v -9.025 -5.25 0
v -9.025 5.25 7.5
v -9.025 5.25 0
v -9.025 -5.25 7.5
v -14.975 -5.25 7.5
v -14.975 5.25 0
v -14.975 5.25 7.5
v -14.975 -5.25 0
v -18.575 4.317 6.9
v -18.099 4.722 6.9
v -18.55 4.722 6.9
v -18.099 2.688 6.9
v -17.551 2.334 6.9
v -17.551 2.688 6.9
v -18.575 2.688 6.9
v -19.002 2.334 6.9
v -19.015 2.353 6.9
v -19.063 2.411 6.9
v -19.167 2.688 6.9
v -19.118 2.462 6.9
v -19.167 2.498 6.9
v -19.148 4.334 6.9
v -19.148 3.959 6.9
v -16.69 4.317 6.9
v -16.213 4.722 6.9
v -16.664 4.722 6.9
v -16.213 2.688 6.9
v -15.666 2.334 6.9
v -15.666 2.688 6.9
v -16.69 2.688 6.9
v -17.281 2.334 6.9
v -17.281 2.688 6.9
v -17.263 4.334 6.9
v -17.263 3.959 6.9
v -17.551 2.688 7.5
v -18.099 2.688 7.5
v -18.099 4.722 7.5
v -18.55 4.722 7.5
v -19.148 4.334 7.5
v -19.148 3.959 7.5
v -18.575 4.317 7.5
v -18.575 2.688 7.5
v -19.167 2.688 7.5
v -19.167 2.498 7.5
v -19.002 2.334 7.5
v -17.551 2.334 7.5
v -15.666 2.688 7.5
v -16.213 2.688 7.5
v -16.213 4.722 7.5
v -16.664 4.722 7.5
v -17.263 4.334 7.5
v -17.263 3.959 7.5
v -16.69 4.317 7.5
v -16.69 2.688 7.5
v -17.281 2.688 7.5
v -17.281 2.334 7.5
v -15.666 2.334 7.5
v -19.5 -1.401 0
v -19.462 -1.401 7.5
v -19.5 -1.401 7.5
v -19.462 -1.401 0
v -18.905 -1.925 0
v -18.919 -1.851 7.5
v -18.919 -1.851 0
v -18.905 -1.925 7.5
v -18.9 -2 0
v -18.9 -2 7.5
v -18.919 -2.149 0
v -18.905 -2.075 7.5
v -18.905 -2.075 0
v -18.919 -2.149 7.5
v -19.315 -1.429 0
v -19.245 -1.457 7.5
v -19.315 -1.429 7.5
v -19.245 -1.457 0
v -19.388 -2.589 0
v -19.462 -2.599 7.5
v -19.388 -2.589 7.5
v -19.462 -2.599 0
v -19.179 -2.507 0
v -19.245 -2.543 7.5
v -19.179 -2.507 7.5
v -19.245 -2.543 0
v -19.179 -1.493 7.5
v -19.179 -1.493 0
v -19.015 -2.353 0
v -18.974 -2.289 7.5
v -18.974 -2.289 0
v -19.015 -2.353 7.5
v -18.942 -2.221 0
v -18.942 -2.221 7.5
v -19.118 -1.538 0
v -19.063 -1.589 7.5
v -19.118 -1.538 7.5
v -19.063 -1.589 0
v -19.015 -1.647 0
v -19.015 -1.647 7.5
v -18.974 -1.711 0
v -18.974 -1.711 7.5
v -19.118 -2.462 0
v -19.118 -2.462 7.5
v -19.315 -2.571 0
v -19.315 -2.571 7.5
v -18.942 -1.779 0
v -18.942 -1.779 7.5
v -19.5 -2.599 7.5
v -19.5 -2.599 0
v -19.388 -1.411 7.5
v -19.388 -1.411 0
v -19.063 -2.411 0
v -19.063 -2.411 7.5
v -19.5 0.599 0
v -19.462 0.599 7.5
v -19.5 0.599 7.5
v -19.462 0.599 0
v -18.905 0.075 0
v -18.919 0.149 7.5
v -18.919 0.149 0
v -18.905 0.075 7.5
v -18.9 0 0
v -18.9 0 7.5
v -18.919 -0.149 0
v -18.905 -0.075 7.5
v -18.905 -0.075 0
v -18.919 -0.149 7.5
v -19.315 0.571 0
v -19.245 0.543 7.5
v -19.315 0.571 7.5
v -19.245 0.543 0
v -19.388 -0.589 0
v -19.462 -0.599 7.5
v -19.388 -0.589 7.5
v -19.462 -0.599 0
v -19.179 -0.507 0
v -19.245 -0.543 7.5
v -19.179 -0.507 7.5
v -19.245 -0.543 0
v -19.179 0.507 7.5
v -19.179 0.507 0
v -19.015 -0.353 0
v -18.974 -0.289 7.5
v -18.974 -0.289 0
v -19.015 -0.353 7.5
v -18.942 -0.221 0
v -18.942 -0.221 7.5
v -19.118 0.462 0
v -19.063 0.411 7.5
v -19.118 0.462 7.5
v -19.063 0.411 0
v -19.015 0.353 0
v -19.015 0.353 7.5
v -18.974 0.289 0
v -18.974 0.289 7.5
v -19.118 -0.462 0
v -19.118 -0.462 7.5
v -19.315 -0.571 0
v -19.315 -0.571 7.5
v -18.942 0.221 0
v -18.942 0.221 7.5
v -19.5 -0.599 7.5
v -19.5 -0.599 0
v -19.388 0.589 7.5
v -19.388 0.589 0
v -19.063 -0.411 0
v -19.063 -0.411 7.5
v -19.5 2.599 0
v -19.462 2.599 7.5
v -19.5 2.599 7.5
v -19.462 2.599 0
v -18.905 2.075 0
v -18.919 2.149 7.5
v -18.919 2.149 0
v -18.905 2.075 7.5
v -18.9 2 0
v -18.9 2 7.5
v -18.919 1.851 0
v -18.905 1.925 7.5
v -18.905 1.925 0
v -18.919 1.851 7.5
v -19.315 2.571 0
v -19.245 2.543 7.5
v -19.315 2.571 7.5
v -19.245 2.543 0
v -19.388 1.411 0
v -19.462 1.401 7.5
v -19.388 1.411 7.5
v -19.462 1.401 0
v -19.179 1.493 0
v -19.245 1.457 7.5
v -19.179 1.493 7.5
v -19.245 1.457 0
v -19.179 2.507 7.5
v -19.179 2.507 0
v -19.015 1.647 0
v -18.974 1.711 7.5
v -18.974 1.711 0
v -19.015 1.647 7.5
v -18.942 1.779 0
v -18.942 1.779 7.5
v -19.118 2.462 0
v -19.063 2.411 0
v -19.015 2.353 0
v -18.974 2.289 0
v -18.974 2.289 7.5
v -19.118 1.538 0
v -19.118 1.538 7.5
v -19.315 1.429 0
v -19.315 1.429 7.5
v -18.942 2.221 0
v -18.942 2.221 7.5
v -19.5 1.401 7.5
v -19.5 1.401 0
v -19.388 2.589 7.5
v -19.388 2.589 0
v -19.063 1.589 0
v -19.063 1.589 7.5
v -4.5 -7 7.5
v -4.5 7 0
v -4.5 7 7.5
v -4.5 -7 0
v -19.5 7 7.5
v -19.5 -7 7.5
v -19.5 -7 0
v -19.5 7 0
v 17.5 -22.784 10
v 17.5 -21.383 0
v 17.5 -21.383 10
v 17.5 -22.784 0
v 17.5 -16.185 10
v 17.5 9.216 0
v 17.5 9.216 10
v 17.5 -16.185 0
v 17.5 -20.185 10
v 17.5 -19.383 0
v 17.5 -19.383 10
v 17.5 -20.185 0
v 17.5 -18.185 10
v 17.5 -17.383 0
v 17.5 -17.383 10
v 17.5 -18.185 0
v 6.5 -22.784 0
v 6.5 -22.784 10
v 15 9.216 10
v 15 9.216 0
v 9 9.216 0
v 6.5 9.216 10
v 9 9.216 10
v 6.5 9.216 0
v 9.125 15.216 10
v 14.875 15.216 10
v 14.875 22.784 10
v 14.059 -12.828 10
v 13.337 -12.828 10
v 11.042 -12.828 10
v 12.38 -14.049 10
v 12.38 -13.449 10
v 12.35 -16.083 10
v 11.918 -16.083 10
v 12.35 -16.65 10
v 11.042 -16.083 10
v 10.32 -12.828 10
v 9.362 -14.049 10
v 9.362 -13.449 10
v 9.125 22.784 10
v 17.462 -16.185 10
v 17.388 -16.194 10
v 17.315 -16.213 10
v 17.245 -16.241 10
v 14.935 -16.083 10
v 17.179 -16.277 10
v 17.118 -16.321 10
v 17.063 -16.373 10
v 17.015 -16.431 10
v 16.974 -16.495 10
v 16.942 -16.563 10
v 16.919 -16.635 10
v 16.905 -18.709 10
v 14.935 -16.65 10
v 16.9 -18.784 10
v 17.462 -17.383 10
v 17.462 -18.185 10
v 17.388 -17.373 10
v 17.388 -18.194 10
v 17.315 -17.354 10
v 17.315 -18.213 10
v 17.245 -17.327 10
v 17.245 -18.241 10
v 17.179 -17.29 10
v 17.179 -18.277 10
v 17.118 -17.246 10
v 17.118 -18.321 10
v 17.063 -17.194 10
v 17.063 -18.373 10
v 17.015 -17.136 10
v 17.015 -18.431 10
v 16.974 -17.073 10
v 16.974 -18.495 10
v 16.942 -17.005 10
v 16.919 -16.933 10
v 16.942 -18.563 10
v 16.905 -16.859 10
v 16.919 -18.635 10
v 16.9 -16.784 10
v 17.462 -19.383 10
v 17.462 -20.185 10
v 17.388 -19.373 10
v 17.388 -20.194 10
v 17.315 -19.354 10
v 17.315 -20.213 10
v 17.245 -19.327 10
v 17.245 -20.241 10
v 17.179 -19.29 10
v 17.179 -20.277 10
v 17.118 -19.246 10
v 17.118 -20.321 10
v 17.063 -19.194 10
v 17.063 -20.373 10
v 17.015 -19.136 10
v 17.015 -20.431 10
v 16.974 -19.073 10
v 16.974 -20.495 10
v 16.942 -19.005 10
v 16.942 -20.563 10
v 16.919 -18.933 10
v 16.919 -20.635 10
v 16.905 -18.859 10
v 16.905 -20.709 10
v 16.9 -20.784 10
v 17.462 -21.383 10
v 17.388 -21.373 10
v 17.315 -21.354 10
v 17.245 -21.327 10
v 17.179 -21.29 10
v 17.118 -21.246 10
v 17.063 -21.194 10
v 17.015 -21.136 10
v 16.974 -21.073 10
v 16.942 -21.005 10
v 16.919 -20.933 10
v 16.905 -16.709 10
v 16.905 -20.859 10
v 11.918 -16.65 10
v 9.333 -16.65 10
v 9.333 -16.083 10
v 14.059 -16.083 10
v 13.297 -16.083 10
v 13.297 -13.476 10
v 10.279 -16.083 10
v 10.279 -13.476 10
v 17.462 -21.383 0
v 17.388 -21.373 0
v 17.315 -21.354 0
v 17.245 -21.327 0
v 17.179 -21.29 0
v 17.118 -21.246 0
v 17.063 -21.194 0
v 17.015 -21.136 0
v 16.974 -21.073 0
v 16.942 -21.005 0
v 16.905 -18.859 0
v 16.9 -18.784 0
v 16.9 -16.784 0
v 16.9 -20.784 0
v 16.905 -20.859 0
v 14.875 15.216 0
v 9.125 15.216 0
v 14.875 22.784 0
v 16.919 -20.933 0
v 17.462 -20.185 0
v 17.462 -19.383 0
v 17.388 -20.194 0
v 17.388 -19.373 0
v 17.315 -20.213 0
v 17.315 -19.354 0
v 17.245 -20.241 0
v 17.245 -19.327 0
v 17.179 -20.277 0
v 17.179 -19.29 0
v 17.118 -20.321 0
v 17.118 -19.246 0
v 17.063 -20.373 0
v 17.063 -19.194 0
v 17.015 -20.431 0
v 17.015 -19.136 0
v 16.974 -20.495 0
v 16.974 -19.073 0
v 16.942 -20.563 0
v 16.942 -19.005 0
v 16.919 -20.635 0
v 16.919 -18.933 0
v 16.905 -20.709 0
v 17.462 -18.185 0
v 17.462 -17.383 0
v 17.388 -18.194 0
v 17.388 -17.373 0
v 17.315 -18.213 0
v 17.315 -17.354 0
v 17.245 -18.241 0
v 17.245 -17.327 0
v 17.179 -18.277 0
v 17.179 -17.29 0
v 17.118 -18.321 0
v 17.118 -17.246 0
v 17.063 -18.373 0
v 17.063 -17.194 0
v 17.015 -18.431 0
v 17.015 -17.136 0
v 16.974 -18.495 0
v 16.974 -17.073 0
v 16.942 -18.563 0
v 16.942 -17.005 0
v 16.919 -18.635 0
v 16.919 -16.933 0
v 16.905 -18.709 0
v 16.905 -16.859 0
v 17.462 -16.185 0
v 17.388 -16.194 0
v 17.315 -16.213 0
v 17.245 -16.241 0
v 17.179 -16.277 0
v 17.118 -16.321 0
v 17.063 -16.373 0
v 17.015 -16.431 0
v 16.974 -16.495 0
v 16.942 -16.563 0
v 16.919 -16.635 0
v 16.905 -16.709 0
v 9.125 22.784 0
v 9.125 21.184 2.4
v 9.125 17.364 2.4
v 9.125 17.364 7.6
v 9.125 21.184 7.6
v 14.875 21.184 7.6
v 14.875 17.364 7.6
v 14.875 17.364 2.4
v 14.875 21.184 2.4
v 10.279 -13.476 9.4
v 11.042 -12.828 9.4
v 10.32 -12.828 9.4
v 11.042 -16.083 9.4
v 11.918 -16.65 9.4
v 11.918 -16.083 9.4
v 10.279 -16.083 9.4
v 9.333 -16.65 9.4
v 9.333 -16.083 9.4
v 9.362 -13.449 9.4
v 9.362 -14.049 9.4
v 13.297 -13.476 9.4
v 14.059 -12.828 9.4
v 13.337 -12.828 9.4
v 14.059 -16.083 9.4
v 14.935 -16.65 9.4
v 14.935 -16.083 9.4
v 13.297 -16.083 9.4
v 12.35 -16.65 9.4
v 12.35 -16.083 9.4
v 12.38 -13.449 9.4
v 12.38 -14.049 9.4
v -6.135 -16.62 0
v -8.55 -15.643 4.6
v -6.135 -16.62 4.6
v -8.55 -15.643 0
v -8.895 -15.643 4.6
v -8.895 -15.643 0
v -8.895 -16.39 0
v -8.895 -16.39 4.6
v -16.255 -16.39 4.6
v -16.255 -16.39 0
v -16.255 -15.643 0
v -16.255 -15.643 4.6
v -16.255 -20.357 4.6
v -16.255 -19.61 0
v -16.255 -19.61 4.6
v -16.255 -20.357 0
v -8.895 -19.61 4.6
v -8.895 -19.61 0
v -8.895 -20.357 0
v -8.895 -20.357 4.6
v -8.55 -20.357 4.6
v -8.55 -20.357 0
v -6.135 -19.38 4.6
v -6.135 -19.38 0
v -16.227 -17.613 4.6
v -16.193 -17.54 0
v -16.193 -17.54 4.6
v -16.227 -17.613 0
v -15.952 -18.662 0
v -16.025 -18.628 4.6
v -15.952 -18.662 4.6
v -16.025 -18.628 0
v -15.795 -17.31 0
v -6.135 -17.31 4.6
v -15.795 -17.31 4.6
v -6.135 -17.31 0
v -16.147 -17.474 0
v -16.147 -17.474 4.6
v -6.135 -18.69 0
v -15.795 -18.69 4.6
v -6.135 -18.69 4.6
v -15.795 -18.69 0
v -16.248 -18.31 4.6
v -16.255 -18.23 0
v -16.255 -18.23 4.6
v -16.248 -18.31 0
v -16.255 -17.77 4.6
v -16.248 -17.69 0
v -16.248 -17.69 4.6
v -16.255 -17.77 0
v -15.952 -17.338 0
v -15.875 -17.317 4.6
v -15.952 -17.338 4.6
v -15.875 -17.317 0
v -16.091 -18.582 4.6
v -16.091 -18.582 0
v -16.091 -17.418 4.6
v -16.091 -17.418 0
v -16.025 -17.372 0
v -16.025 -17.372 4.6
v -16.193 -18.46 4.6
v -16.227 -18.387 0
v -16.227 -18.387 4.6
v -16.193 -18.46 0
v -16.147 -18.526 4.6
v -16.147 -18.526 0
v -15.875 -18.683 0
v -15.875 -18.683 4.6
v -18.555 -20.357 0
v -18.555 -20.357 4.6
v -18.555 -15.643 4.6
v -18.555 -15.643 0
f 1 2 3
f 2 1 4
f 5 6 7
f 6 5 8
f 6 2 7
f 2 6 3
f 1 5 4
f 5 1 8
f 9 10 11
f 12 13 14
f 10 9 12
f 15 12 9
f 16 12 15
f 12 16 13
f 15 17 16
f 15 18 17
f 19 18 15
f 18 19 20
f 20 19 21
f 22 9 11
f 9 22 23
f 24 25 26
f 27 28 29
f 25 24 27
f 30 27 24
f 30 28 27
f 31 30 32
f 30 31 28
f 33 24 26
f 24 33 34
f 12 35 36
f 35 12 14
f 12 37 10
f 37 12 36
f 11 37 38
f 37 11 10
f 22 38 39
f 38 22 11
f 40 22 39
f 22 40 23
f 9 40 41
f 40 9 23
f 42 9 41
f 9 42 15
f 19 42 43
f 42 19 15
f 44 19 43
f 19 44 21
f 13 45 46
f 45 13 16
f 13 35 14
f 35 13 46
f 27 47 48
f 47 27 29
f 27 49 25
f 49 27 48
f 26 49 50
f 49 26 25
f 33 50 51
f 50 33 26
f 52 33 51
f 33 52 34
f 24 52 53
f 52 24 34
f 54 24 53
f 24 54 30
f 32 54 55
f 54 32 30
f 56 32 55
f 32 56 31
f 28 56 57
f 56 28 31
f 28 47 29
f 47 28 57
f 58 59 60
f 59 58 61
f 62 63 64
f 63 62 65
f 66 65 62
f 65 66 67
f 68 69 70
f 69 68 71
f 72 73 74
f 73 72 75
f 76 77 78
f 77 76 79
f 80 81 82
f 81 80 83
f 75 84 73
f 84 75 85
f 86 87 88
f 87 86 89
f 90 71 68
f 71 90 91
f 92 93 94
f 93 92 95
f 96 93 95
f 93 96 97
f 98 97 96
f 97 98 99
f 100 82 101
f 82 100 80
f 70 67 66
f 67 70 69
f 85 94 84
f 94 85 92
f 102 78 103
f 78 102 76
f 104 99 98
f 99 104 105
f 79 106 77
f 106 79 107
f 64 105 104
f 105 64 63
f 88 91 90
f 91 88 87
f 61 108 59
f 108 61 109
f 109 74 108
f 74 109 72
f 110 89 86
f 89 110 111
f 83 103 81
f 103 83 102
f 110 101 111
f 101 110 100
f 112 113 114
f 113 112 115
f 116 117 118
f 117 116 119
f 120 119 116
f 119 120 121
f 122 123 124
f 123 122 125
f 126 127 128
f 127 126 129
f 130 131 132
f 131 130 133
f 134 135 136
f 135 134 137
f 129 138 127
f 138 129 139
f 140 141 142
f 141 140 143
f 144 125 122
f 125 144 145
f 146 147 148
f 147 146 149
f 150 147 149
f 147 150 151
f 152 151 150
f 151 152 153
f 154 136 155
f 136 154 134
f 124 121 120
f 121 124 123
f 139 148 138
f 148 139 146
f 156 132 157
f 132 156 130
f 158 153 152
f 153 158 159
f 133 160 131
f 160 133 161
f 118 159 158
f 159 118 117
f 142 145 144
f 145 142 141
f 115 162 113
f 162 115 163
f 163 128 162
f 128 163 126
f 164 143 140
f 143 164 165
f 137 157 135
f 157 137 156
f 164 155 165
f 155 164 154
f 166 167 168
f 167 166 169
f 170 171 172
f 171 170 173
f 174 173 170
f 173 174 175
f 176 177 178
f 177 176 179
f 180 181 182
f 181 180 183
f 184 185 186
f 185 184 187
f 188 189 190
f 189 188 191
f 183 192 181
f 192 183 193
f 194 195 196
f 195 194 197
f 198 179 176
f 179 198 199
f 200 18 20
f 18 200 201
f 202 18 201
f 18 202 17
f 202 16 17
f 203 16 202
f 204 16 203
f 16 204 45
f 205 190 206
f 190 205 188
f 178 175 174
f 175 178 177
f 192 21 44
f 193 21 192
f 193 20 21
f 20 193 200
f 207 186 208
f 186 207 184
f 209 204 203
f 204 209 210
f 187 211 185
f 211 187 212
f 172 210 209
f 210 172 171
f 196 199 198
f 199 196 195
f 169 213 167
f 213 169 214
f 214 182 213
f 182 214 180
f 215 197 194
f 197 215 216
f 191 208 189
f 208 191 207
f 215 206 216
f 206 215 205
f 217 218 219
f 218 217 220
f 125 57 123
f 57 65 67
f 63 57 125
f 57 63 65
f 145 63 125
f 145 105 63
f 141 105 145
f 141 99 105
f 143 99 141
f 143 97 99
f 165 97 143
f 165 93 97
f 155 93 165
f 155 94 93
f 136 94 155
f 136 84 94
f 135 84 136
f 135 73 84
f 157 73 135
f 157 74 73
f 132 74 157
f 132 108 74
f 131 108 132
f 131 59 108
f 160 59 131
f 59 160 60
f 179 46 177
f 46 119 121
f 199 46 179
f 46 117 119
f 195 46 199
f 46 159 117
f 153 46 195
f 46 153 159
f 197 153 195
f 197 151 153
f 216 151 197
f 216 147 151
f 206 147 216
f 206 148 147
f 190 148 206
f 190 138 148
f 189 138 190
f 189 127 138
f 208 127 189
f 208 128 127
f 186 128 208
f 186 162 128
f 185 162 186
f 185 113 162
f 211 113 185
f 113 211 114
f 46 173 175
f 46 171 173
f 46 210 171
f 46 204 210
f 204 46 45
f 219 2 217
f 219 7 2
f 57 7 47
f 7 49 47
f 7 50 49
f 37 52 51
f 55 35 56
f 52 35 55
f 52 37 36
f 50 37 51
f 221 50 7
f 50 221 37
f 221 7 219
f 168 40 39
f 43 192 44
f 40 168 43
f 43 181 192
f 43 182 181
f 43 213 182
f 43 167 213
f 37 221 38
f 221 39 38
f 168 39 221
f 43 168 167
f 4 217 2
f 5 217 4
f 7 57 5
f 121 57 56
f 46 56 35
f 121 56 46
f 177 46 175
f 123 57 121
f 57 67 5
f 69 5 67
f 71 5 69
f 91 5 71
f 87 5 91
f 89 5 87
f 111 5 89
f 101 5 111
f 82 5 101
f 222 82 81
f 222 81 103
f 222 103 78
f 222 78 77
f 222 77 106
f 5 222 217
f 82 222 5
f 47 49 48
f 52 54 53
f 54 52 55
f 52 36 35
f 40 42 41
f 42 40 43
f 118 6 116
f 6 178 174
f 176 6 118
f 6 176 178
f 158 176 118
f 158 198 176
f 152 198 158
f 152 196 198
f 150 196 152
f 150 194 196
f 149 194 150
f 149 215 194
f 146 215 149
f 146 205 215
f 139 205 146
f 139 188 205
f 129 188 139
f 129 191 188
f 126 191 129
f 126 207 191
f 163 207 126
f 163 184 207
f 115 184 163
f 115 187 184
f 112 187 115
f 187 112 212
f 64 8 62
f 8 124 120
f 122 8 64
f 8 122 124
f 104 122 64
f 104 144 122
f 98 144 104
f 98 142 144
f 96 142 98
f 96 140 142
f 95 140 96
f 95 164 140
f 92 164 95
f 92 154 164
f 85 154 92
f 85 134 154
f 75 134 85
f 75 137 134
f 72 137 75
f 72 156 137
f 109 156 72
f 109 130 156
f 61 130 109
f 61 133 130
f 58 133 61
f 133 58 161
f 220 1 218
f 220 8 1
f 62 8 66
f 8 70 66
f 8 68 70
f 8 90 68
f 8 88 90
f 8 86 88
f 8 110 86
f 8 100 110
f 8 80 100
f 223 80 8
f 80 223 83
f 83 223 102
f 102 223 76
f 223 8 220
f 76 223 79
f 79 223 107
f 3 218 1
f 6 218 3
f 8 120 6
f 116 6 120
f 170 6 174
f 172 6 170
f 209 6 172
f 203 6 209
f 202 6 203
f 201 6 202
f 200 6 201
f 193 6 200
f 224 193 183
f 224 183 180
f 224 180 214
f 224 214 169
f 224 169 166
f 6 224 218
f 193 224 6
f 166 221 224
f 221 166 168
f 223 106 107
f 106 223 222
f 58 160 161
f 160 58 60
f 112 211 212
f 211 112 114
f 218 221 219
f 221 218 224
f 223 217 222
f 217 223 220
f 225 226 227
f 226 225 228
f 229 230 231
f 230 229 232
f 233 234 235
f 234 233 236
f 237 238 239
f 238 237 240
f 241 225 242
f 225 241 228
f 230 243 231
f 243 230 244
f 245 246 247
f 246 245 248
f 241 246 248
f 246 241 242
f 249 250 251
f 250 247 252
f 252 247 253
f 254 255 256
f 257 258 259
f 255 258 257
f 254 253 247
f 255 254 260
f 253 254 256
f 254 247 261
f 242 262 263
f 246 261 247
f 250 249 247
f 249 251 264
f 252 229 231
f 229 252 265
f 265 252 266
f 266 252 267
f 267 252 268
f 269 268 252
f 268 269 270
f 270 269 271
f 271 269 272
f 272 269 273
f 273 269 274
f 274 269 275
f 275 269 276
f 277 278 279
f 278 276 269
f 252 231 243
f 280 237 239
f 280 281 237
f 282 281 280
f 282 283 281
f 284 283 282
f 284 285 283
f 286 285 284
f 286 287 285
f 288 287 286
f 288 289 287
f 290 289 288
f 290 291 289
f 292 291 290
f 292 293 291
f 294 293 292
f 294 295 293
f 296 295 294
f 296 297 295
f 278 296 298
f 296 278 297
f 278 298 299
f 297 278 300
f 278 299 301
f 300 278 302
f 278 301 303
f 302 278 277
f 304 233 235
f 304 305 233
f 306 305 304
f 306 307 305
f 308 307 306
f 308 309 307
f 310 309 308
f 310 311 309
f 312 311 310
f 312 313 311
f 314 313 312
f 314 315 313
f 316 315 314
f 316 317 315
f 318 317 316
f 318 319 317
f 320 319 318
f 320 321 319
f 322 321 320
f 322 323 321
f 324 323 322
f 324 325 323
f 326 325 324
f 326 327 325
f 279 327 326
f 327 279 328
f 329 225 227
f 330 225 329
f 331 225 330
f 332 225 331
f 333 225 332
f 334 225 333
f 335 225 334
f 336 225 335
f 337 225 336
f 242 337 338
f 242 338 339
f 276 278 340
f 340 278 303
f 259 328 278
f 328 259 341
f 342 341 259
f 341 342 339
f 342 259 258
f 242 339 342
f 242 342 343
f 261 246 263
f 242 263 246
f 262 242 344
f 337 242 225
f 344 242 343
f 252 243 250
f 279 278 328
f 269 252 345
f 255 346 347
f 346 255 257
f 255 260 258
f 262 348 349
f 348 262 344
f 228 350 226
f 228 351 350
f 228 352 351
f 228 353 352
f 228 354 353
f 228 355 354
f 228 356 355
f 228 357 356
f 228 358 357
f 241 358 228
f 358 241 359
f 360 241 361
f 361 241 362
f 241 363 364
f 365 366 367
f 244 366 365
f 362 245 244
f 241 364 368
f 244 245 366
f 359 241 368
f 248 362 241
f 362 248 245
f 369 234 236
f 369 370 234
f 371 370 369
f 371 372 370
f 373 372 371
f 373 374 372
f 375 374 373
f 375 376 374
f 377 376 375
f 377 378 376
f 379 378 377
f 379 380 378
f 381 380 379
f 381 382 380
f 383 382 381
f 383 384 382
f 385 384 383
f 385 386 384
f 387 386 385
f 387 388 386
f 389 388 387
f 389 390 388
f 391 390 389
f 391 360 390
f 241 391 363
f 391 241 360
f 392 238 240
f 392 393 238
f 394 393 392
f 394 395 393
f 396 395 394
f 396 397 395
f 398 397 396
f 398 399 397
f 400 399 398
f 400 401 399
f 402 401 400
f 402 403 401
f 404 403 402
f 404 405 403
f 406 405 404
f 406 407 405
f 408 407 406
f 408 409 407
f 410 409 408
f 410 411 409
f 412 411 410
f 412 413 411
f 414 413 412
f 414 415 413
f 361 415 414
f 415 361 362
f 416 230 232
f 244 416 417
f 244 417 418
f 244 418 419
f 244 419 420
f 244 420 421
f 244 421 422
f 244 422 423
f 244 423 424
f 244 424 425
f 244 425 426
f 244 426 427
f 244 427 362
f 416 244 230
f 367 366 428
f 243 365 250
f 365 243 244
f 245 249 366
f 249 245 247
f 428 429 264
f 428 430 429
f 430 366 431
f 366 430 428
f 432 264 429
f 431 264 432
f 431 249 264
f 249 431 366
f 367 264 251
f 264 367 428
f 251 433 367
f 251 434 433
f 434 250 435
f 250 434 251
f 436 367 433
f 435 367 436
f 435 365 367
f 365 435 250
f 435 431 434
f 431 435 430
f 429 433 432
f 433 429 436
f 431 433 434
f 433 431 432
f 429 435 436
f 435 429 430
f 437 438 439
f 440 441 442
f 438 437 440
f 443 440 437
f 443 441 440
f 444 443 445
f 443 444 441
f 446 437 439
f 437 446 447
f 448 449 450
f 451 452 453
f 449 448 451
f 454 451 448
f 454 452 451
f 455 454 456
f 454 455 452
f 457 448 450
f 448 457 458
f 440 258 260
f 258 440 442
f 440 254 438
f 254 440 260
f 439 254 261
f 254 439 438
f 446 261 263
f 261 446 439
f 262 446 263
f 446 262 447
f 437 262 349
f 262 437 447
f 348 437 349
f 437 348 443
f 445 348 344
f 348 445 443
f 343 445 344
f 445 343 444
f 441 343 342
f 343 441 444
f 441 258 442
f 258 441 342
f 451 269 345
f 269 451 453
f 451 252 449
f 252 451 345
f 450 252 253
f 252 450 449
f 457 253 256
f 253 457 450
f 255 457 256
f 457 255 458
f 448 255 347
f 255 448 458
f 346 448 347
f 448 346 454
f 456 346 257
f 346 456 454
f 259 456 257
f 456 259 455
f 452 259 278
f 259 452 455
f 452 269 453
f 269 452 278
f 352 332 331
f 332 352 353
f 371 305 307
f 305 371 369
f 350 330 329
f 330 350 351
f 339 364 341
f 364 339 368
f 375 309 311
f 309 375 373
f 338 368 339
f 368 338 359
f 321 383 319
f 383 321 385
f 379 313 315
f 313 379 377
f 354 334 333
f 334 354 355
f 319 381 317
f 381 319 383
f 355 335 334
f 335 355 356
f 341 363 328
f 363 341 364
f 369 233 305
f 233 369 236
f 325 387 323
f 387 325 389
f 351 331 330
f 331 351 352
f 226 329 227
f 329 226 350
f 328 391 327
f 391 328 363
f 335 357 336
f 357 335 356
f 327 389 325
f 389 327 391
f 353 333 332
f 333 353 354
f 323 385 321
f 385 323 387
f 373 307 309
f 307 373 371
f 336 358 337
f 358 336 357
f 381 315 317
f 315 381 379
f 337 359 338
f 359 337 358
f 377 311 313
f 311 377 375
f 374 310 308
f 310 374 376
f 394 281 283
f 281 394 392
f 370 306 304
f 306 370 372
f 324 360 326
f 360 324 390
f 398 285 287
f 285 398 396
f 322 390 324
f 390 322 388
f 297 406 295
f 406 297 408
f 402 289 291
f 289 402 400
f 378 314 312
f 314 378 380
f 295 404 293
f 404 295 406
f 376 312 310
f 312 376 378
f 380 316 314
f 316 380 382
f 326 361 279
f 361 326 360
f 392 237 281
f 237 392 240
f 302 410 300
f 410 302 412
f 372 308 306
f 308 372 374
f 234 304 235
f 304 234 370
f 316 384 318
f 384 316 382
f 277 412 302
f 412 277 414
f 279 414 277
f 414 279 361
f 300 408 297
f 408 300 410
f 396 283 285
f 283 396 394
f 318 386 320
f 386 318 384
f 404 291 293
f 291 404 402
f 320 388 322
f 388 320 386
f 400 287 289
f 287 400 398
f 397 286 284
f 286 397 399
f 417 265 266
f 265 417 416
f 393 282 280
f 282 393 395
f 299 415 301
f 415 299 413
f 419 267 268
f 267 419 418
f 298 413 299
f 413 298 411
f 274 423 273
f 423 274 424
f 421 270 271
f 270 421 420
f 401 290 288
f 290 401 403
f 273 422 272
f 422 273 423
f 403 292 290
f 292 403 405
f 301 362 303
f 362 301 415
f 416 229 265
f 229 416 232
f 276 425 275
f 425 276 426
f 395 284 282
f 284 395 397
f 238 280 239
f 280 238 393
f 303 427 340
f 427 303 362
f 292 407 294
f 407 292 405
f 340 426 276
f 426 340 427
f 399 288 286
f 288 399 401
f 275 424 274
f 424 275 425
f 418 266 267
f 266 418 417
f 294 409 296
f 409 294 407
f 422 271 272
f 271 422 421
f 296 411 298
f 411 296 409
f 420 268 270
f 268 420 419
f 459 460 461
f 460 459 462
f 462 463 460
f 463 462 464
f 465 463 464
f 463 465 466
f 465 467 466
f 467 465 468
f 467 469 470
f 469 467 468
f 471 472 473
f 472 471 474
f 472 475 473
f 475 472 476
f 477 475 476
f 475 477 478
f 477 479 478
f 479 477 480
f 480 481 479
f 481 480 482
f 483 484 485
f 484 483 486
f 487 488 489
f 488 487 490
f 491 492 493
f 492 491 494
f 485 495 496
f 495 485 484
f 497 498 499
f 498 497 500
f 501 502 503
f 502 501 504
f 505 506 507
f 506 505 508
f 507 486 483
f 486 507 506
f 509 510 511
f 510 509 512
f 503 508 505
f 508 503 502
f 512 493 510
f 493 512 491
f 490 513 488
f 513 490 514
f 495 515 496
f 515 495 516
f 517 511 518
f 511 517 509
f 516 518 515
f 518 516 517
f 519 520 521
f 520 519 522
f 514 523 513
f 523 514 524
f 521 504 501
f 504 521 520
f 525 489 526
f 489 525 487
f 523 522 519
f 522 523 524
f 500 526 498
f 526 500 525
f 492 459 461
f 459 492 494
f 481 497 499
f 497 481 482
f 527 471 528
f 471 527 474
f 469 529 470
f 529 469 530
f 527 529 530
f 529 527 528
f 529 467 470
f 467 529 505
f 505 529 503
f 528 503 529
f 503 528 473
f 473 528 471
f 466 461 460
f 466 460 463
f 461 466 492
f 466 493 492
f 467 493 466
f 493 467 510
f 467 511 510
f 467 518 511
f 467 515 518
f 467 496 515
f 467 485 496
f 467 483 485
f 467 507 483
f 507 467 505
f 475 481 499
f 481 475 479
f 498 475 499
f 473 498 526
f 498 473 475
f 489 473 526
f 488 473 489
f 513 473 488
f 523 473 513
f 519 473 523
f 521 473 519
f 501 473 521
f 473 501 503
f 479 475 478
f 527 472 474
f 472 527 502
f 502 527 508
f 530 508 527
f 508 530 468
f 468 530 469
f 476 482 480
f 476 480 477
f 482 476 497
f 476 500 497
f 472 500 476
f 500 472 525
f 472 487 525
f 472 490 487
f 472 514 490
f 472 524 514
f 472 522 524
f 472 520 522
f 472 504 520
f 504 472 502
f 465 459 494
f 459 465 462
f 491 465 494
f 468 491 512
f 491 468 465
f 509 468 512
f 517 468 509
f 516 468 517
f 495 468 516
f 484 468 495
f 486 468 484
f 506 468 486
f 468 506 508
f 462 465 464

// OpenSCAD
$fn = 50;

difference() {
	union() {
		translate(v = [-12, -5, 0]) {
			rotate(a = [0, 0, 0]) {
				difference() {
					union() {
						translate(v = [-7.5, -2.0, 0]) {
							cube(size = [15.0, 14.0, 7.5]);
						}
					}
					union() {
						translate(v = [-2.975, -0.25, -0.1]) {
							cube(size = [5.95, 10.5, 7.7]);
						}
						translate(v = [-5.5, 8.5, 6.9]) {
							linear_extrude(height = 0.7) {
								text(font = "Arial:style=Bold", halign = "center", size = 2.5, text = "11", valign = "center");
							}
						}
						translate(v = [-7.5, 3, -0.1]) {
							cylinder(h = 7.7, r = 0.6);
						}
						translate(v = [-7.5, 5, -0.1]) {
							cylinder(h = 7.7, r = 0.6);
						}
						translate(v = [-7.5, 7, -0.1]) {
							cylinder(h = 7.7, r = 0.6);
						}
					}
				}
			}
		}
		translate(v = [12, 9.21625, 0]) {
			rotate(a = [90, 0, 0]) {
				difference() {
					union() {
						translate(v = [-5.5, 0, 0]) {
							cube(size = [11.0, 10.0, 32.0]);
						}
						translate(v = [0, 10.0, 0]) {
							rotate(a = [90, 0, 0]) {
								linear_extrude(height = 10.0) {
									polygon(points = [[-2.875, -13.5675], [2.875, -13.5675], [2.875, -6.0], [3.0, 0], [3.0, 0.1], [-3.0, 0.1], [-3.0, 0], [-2.875, -6.0]]);
								}
							}
						}
					}
					union() {
						translate(v = [-2.975, 2.4000000000000004, -11.9675]) {
							cube(size = [5.95, 5.199999999999999, 3.8200000000000003]);
						}
						translate(v = [0, 9.4, 24.0]) {
							rotate(a = [-90, 0, 0]) {
								linear_extrude(height = 0.7) {
									text(font = "Arial:style=Bold", halign = "center", size = 4.0, text = "11", valign = "center");
								}
							}
						}
						translate(v = [5.5, 10.1, 30.0]) {
							rotate(a = [90, 0, 0]) {
								cylinder(h = 10.2, r = 0.6);
							}
						}
						translate(v = [5.5, 10.1, 28.0]) {
							rotate(a = [90, 0, 0]) {
								cylinder(h = 10.2, r = 0.6);
							}
						}
						translate(v = [5.5, 10.1, 26.0]) {
							rotate(a = [90, 0, 0]) {
								cylinder(h = 10.2, r = 0.6);
							}
						}
					}
				}
			}
		}
		translate(v = [-12, -18, 0]) {
			rotate(a = [90, 0, 0]) {
				difference() {
					union() {
						translate(v = [-6.555, 0, -2.3575]) {
							cube(size = [12.42, 4.6, 4.715]);
						}
					}
					union() {
						translate(v = [0, 4.699999999999999, 0]) {
							rotate(a = [90, 0, 0]) {
								linear_extrude(height = 4.8) {
									polygon(points = [[-4.255, -1.61], [3.105, -1.61], [3.105, -2.3575], [3.45, -2.3575], [5.865, -1.38], [5.965, -1.38], [5.965, -2.4575], [-4.255, -2.4575]]);
								}
							}
						}
						translate(v = [0, 4.699999999999999, 0]) {
							rotate(a = [90, 0, 0]) {
								linear_extrude(height = 4.8) {
									polygon(points = [[-4.255, 1.61], [3.105, 1.61], [3.105, 2.3575], [3.45, 2.3575], [5.865, 1.38], [5.965, 1.38], [5.965, 2.4575], [-4.255, 2.4575]]);
								}
							}
						}
						translate(v = [0, 4.699999999999999, 0]) {
							rotate(a = [90, 0, 0]) {
								linear_extrude(height = 4.8) {
									polygon(points = [[-4.255, 0.23], [-4.248012, 0.309878], [-4.227259, 0.387329], [-4.193372, 0.46], [-4.14738, 0.525682], [-4.090682, 0.58238], [-4.025, 0.628372], [-3.952329, 0.662259], [-3.874878, 0.683012], [-3.795, 0.69], [5.965, 0.69], [5.965, -0.69], [-3.795, -0.69], [-3.874878, -0.683012], [-3.952329, -0.662259], [-4.025, -0.628372], [-4.090682, -0.58238], [-4.14738, -0.525682], [-4.193372, -0.46], [-4.227259, -0.387329], [-4.248012, -0.309878], [-4.255, -0.23]]);
								}
							}
						}
					}
				}
			}
		}
	}
	union();
}
